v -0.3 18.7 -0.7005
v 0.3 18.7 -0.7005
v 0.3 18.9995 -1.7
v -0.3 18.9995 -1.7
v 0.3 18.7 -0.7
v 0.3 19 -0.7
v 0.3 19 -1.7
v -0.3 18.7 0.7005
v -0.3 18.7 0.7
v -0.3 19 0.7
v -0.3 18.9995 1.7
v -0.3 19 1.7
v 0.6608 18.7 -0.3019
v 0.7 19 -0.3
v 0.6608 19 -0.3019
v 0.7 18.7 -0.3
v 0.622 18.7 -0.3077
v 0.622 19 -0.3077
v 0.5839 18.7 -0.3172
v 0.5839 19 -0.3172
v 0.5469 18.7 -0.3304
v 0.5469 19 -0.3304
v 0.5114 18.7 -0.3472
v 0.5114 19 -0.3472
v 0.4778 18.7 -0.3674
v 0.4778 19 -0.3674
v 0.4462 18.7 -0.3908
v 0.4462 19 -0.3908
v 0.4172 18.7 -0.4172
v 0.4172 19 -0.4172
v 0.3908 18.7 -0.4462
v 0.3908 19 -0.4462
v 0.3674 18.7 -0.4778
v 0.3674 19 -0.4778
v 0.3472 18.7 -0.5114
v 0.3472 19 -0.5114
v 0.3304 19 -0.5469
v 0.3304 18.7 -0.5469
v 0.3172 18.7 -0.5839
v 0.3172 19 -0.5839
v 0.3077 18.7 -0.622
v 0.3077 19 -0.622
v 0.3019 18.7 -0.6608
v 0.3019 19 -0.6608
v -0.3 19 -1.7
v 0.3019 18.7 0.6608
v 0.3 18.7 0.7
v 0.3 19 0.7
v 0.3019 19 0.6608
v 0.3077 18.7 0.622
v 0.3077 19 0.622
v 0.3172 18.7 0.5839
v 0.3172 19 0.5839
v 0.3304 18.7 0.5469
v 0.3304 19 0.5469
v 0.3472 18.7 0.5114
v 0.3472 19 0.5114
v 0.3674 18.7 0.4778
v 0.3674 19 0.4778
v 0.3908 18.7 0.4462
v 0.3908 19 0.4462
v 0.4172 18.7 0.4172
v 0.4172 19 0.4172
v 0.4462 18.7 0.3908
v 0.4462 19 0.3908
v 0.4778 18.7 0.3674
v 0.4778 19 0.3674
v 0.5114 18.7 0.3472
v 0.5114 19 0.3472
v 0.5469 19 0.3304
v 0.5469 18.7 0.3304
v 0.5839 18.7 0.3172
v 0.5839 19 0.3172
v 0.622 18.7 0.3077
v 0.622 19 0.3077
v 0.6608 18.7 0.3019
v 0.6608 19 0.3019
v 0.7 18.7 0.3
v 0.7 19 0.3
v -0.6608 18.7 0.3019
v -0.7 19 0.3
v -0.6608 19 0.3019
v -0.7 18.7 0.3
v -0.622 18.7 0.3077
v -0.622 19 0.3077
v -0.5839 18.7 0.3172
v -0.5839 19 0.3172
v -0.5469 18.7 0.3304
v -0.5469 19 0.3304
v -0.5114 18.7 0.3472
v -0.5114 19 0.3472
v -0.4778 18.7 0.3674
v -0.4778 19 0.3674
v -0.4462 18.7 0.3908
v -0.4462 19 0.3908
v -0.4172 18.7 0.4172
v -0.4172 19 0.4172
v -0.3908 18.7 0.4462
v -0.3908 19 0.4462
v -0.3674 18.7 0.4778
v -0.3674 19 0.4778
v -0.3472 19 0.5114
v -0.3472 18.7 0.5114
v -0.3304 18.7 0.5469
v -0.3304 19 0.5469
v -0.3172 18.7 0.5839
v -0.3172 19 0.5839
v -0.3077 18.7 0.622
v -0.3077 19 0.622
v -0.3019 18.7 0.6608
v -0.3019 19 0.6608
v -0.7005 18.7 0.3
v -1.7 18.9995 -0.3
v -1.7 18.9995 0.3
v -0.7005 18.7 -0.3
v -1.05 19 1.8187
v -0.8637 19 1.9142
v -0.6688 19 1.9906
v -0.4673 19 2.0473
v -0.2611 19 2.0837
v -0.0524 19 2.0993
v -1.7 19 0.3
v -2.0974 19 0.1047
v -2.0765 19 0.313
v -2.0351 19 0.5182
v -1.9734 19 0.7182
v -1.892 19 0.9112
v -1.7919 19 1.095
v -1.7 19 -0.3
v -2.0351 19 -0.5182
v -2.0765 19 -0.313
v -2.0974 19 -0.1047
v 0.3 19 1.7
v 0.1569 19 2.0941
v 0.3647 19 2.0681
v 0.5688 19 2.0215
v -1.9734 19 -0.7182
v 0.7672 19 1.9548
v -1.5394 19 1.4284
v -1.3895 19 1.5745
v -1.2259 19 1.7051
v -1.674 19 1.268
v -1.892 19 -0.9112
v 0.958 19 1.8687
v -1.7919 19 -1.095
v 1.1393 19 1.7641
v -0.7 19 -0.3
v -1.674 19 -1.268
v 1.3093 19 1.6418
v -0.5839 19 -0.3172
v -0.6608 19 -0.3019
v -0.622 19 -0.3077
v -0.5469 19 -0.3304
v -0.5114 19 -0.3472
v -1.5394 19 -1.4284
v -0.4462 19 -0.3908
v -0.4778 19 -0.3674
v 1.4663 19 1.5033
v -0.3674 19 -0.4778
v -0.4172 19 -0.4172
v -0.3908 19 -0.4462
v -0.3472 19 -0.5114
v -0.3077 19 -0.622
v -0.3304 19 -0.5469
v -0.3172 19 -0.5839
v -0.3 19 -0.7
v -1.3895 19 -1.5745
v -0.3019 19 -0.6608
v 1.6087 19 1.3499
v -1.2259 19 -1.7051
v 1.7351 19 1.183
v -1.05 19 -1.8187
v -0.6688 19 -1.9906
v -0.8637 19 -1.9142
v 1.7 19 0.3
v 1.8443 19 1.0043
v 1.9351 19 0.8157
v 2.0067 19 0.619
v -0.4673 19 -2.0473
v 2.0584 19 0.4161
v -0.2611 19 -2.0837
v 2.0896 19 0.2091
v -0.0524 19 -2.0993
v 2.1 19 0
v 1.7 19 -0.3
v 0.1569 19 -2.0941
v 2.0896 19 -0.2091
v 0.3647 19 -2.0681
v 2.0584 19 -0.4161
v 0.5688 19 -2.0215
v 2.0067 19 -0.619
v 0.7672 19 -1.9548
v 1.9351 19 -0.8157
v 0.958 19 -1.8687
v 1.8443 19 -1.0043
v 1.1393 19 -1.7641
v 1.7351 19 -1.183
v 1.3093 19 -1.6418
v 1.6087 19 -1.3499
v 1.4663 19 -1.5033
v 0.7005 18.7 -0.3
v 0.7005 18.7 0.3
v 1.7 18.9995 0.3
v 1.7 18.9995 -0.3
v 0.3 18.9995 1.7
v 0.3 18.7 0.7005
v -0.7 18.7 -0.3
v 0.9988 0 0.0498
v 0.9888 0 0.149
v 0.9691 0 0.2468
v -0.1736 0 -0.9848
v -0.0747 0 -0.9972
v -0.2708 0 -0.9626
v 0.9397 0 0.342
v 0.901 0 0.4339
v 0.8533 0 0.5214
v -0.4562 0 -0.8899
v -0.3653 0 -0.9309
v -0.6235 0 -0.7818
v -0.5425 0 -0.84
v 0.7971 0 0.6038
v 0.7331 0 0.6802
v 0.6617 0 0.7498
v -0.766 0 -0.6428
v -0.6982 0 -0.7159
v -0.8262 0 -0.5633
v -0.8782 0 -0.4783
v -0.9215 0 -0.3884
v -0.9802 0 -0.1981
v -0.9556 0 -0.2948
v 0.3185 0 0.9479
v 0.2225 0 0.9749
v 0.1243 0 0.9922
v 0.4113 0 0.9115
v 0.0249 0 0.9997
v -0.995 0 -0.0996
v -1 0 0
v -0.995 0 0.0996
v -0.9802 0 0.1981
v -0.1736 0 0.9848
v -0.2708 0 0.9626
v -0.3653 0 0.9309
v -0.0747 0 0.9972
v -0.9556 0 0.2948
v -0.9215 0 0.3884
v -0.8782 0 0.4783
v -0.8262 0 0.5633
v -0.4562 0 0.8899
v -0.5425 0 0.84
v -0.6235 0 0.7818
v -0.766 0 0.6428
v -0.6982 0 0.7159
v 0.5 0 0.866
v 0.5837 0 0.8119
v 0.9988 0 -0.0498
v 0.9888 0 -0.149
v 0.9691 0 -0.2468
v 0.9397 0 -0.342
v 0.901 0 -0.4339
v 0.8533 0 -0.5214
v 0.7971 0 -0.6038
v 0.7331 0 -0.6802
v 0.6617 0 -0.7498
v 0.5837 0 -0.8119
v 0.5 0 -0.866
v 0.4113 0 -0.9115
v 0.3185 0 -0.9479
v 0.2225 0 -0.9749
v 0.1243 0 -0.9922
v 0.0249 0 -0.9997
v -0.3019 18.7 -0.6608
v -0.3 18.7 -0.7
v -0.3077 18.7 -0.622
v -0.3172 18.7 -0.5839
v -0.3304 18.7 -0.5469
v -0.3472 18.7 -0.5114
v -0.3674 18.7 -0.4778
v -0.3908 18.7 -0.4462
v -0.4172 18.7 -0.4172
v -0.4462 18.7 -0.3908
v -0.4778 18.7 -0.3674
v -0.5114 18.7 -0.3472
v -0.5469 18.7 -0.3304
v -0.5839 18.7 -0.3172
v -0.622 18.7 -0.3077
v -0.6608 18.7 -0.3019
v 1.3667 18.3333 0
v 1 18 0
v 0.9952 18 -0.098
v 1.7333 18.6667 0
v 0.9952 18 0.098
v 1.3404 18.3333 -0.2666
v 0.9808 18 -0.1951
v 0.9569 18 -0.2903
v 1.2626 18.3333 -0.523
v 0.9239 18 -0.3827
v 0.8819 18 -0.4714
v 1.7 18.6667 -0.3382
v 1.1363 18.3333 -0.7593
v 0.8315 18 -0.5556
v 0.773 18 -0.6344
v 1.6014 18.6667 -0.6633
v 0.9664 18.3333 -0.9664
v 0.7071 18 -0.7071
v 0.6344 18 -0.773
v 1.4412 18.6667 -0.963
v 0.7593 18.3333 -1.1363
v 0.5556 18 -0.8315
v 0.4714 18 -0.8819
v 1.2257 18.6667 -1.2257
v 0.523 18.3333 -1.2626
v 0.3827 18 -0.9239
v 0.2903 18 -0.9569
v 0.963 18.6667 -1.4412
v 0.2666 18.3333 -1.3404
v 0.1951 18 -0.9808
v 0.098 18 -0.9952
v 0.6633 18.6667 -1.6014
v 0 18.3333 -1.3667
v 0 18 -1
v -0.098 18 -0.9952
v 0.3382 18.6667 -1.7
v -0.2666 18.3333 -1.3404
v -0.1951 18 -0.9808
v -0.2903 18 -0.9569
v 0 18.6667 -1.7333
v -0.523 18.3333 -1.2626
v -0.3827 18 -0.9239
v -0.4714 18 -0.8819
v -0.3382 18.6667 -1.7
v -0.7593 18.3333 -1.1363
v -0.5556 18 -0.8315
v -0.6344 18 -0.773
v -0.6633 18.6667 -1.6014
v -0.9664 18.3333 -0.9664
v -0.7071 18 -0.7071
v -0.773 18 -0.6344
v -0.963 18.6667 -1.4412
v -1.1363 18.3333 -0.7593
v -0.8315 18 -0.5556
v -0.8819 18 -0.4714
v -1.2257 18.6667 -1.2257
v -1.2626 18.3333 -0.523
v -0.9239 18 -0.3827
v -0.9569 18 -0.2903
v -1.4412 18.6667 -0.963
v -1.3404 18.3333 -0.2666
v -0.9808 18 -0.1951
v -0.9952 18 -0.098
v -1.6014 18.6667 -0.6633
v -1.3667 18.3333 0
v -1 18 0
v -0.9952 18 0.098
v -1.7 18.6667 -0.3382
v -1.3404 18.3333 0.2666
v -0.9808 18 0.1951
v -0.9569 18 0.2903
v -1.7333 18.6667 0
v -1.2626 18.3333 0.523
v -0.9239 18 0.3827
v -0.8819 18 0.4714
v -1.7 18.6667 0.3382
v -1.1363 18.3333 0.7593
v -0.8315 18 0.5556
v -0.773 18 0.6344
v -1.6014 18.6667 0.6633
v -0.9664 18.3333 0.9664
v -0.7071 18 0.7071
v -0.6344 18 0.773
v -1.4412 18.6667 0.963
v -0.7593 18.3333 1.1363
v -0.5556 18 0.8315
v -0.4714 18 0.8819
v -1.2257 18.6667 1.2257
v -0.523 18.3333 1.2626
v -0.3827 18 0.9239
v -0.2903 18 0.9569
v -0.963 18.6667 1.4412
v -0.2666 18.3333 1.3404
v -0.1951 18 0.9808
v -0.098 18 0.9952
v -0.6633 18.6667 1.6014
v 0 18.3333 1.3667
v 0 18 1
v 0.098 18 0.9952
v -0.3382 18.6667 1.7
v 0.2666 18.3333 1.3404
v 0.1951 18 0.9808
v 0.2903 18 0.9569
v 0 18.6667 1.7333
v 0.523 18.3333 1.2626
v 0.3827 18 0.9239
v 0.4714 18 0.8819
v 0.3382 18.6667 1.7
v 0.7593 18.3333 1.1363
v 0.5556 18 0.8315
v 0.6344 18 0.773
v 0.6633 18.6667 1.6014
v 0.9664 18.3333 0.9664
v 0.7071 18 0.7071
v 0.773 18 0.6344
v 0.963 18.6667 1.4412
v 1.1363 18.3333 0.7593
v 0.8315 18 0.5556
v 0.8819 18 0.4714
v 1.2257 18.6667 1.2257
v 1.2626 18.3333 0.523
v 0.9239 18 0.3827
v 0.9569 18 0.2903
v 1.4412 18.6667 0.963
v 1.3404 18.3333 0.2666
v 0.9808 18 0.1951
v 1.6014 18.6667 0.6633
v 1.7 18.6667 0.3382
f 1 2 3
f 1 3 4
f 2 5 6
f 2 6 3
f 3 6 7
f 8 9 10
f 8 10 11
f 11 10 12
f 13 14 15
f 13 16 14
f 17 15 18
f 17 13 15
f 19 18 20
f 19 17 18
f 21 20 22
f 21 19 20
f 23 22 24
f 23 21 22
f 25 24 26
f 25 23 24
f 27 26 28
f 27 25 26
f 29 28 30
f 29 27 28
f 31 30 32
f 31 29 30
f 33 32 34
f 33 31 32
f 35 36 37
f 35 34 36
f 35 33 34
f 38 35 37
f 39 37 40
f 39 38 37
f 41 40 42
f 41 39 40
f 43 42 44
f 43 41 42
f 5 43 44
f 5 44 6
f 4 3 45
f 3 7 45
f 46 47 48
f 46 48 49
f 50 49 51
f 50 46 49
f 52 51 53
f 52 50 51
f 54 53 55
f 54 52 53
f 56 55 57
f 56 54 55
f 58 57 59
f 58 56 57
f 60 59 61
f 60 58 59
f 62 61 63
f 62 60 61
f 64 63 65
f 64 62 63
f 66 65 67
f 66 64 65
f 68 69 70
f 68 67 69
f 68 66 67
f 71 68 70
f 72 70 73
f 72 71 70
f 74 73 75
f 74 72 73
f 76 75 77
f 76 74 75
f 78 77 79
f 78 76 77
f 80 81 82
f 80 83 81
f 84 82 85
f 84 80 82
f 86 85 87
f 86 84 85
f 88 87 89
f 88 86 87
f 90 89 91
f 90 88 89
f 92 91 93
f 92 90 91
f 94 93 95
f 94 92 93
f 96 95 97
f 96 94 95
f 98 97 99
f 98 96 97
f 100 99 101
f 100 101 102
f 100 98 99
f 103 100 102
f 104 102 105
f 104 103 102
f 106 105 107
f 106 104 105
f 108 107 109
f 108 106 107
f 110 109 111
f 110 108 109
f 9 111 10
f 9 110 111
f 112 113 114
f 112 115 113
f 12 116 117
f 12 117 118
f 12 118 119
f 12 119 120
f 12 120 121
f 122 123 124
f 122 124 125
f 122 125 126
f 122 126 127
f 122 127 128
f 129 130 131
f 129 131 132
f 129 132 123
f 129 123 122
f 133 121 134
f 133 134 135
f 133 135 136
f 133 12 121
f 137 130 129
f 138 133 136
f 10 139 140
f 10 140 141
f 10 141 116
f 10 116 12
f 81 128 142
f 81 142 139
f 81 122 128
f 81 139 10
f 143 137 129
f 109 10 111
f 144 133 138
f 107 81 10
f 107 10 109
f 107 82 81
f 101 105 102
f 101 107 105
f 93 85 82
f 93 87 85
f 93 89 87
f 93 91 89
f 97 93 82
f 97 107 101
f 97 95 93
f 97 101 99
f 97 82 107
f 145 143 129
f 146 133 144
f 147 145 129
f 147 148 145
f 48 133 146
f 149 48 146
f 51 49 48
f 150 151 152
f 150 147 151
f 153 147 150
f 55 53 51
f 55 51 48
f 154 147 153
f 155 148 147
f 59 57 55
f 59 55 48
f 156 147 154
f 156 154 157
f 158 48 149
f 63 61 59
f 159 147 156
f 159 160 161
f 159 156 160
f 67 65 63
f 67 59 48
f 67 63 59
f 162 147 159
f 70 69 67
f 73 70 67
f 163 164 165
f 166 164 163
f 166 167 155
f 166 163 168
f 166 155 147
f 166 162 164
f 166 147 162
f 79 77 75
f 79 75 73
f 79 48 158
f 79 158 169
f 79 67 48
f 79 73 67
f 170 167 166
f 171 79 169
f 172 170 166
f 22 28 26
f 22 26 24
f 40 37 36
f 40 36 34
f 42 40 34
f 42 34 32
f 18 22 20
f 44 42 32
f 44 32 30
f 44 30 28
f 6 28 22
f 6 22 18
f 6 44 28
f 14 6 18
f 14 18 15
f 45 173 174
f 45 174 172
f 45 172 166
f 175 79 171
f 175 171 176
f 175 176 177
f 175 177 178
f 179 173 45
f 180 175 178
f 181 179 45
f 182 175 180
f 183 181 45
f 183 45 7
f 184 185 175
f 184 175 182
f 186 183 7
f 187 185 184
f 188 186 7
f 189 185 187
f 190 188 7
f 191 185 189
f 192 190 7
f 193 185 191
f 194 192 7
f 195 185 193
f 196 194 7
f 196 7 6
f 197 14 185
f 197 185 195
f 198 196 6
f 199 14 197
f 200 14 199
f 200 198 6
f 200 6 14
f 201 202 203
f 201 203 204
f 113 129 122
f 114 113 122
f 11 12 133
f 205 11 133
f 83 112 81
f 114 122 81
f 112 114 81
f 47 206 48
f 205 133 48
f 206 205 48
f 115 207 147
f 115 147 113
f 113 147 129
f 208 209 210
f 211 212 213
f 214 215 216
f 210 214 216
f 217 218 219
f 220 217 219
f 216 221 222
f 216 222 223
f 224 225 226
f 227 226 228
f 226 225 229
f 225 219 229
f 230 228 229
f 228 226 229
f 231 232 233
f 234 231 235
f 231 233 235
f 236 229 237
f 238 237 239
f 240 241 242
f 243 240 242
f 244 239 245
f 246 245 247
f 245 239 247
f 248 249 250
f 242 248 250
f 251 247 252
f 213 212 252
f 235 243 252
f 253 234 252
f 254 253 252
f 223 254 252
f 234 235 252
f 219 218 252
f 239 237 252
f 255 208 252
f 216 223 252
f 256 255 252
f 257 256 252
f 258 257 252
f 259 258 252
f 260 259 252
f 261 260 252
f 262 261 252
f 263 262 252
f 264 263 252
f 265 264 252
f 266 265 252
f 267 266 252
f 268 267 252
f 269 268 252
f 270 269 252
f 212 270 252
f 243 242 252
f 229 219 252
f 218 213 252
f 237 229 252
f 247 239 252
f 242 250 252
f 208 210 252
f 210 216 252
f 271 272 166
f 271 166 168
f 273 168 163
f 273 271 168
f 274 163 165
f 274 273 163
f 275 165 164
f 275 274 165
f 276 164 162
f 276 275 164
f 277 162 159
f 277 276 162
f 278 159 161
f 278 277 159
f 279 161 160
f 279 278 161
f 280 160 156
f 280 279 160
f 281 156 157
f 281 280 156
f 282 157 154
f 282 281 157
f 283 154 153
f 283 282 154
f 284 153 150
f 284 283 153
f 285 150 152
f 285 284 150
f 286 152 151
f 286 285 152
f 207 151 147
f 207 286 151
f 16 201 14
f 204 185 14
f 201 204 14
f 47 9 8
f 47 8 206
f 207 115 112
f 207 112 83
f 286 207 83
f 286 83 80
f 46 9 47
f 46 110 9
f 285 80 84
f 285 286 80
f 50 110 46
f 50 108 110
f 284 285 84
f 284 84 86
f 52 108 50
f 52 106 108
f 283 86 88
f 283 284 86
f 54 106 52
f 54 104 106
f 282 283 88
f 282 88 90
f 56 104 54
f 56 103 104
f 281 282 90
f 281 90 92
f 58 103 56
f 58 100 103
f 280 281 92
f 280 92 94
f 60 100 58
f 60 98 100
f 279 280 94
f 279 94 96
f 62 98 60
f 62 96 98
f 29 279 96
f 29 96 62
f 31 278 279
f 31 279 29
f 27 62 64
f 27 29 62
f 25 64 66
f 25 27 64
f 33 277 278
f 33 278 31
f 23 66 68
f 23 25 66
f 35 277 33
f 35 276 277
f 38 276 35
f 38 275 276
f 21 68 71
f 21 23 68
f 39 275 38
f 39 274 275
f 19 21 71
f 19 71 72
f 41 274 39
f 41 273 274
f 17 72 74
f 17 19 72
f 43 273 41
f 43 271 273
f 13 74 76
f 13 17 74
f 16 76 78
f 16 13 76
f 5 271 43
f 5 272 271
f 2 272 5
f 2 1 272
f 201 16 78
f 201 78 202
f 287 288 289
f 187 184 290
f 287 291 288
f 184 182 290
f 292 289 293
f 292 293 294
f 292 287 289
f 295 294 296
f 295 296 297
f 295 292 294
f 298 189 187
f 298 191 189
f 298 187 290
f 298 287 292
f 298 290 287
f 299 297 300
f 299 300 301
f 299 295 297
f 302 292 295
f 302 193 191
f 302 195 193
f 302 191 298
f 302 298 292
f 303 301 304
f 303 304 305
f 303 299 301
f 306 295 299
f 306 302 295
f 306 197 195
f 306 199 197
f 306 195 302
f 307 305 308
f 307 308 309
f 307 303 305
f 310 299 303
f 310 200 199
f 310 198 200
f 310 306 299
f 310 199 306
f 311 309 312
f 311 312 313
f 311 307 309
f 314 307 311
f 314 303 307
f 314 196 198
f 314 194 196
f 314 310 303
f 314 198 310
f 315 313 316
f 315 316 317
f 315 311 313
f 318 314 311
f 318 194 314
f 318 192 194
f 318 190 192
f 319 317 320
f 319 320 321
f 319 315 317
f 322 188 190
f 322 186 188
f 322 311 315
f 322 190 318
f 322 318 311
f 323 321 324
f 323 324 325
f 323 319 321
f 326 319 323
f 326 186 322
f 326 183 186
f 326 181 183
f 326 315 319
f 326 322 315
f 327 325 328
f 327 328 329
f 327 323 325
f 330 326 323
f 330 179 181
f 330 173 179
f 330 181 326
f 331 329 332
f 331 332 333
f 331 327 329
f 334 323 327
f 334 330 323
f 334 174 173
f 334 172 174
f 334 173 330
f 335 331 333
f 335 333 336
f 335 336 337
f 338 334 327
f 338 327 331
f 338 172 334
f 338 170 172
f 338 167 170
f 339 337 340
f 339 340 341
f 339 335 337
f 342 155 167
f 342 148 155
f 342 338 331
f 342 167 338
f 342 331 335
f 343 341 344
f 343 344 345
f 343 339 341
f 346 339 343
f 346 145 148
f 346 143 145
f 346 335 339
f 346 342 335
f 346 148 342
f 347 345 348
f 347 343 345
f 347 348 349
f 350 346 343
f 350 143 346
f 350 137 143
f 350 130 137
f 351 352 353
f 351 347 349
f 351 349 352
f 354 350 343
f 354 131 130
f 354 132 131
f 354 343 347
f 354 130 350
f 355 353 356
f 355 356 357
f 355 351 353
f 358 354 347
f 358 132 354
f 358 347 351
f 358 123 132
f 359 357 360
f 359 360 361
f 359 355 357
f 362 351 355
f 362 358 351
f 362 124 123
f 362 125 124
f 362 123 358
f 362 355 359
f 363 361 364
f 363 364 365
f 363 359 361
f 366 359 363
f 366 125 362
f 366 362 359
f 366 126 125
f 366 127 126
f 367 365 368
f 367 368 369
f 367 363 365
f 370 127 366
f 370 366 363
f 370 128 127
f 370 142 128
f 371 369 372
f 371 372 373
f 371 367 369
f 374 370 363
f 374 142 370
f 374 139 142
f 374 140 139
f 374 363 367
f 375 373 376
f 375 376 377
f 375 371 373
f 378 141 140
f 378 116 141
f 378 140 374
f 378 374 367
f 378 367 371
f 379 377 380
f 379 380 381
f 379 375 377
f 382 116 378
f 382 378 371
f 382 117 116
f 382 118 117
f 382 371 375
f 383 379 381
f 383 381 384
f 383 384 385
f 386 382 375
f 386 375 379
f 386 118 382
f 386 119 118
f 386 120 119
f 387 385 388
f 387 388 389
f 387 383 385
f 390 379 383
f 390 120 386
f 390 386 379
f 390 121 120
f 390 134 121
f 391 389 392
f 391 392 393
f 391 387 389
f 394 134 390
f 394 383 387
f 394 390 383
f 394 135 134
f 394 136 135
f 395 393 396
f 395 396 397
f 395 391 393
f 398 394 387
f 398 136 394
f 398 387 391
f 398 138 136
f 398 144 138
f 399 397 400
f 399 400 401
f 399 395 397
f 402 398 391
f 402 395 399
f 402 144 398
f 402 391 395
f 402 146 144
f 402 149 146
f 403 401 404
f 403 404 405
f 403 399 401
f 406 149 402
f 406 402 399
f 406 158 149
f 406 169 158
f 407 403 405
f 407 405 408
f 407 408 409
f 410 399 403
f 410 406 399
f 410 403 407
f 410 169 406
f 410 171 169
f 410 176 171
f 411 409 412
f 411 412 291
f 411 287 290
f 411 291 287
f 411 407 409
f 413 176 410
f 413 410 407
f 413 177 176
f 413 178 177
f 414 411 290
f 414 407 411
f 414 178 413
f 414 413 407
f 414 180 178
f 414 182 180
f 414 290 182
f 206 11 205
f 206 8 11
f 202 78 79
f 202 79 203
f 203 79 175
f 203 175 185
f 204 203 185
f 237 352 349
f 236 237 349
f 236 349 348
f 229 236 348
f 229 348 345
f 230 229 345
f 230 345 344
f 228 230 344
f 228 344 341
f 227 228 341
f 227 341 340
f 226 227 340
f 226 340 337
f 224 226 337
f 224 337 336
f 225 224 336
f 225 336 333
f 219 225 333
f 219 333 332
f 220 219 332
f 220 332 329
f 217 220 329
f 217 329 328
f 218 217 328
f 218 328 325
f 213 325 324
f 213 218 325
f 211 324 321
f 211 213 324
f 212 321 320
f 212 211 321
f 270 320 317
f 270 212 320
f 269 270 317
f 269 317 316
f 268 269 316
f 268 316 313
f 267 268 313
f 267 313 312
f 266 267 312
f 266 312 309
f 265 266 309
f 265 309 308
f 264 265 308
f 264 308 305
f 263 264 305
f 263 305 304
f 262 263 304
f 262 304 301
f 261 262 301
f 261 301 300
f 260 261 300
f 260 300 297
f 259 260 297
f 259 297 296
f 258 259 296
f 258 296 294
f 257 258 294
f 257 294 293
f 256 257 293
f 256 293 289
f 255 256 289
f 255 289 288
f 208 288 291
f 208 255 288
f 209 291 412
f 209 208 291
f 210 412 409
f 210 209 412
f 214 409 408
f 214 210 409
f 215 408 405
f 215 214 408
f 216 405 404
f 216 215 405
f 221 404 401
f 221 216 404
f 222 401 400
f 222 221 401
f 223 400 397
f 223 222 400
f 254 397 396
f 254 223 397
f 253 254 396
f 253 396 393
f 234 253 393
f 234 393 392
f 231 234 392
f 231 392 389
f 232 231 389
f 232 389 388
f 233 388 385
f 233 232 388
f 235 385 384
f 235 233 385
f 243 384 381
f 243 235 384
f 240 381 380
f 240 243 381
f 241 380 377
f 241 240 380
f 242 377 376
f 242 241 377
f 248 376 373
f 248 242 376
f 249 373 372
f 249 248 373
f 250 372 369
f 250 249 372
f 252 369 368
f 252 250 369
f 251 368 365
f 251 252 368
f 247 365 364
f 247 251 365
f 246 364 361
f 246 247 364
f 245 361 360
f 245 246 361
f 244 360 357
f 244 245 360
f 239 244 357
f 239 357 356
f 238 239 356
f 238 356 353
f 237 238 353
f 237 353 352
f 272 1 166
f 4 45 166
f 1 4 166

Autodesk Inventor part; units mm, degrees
ref_plane "YZ Plane" through (0, 0, 0) normal (1, 0, 0) x (0, 1, 0)
ref_plane "XZ Plane" through (0, 0, 0) normal (0, 1, 0) x (-1, 0, 0)
sketch "Sketch1" plane through (0, 0, 0) normal (0, 1, 0) x (-1, 0, 0)
  circle A0 centre (0, 0) radius 1
  dimension "d0" = 2
extrude "Extrusion1" add sketch "Sketch1" along normal blind 19
sketch "Sketch2" plane through (0, 19, 0) normal (0, 1, 0) x (1, 0, 0)
  circle A0 centre (0, 0) radius 2.1
  dimension "d3" = 4.2
ref_plane "Work Plane1" through (0, 18, 0) normal (0, 1, 0) x (1, 0, 0)
sketch "Sketch3" plane through (0, 18, 0) normal (0, 1, 0) x (1, 0, 0)
  circle A0 centre (0, 0) radius 1 projected
loft "Loft1" add profiles "Sketch3", "Sketch2"
sketch "Sketch4" plane through (0, 19, 0) normal (0, 1, 0) x (1, 0, 0)
  line L0 (-1.7, -0.3) -> (1.7, -0.3)
  line L1 (1.7, -0.3) -> (1.7, 0.3)
  line L2 (1.7, 0.3) -> (-1.7, 0.3)
  line L3 (-1.7, 0.3) -> (-1.7, -0.3)
  line L4 (-0.3, -1.7) -> (0.3, -1.7)
  line L5 (0.3, -1.7) -> (0.3, 1.7)
  line L6 (0.3, 1.7) -> (-0.3, 1.7)
  line L7 (-0.3, 1.7) -> (-0.3, -1.7)
  point P0 (0, 0)
  point P1 (-1.7, 0)
  point P2 (0, -1.7)
  point P3 (0, -0.3)
  point P4 (0.3, 0)
  point P5 (-0.3, -0.3)
  point P6 (0.3, -0.3)
  point P7 (0.3, 0.3)
  point P8 (-0.3, 0.3)
  dimension "d9" = 3.4
  dimension "d10" = 3.4
  dimension "d11" = 0.6
  dimension "d12" = 0.6
extrude "Extrusion2" cut sketch "Sketch4" against normal blind 0.3
chamfer "Chamfer1" distance 0.3 distance2 1 1 edges at (1.7, 18.7, 0) measured on face at (1.7, 18.9, 0.1)
chamfer "Chamfer2" distance 0.3 distance2 1 1 edges at (0, 18.7, 1.7) measured on face at (-0.1, 18.9, 1.7)
chamfer "Chamfer3" distance 0.3 distance2 1 1 edges at (-1.7, 18.7, 0) measured on face at (-1.7, 18.9, -0.1)
chamfer "Chamfer4" distance 0.3 distance2 1 1 edges at (0, 18.7, -1.7) measured on face at (0.1, 18.9, -1.7)
fillet "Fillet1" radius 0.4 4 edges at (0.3, 18.85, 0.3) (-0.3, 18.85, 0.3) (0.3, 18.85, -0.3) (-0.3, 18.85, -0.3)
thread "Thread1" size "M2x0.4" class "6g" standard "ANSI Metric M Profile" full length
equation "\"d12\" = d11"
properties part number "m2_18mm" material "Stainless Steel"
